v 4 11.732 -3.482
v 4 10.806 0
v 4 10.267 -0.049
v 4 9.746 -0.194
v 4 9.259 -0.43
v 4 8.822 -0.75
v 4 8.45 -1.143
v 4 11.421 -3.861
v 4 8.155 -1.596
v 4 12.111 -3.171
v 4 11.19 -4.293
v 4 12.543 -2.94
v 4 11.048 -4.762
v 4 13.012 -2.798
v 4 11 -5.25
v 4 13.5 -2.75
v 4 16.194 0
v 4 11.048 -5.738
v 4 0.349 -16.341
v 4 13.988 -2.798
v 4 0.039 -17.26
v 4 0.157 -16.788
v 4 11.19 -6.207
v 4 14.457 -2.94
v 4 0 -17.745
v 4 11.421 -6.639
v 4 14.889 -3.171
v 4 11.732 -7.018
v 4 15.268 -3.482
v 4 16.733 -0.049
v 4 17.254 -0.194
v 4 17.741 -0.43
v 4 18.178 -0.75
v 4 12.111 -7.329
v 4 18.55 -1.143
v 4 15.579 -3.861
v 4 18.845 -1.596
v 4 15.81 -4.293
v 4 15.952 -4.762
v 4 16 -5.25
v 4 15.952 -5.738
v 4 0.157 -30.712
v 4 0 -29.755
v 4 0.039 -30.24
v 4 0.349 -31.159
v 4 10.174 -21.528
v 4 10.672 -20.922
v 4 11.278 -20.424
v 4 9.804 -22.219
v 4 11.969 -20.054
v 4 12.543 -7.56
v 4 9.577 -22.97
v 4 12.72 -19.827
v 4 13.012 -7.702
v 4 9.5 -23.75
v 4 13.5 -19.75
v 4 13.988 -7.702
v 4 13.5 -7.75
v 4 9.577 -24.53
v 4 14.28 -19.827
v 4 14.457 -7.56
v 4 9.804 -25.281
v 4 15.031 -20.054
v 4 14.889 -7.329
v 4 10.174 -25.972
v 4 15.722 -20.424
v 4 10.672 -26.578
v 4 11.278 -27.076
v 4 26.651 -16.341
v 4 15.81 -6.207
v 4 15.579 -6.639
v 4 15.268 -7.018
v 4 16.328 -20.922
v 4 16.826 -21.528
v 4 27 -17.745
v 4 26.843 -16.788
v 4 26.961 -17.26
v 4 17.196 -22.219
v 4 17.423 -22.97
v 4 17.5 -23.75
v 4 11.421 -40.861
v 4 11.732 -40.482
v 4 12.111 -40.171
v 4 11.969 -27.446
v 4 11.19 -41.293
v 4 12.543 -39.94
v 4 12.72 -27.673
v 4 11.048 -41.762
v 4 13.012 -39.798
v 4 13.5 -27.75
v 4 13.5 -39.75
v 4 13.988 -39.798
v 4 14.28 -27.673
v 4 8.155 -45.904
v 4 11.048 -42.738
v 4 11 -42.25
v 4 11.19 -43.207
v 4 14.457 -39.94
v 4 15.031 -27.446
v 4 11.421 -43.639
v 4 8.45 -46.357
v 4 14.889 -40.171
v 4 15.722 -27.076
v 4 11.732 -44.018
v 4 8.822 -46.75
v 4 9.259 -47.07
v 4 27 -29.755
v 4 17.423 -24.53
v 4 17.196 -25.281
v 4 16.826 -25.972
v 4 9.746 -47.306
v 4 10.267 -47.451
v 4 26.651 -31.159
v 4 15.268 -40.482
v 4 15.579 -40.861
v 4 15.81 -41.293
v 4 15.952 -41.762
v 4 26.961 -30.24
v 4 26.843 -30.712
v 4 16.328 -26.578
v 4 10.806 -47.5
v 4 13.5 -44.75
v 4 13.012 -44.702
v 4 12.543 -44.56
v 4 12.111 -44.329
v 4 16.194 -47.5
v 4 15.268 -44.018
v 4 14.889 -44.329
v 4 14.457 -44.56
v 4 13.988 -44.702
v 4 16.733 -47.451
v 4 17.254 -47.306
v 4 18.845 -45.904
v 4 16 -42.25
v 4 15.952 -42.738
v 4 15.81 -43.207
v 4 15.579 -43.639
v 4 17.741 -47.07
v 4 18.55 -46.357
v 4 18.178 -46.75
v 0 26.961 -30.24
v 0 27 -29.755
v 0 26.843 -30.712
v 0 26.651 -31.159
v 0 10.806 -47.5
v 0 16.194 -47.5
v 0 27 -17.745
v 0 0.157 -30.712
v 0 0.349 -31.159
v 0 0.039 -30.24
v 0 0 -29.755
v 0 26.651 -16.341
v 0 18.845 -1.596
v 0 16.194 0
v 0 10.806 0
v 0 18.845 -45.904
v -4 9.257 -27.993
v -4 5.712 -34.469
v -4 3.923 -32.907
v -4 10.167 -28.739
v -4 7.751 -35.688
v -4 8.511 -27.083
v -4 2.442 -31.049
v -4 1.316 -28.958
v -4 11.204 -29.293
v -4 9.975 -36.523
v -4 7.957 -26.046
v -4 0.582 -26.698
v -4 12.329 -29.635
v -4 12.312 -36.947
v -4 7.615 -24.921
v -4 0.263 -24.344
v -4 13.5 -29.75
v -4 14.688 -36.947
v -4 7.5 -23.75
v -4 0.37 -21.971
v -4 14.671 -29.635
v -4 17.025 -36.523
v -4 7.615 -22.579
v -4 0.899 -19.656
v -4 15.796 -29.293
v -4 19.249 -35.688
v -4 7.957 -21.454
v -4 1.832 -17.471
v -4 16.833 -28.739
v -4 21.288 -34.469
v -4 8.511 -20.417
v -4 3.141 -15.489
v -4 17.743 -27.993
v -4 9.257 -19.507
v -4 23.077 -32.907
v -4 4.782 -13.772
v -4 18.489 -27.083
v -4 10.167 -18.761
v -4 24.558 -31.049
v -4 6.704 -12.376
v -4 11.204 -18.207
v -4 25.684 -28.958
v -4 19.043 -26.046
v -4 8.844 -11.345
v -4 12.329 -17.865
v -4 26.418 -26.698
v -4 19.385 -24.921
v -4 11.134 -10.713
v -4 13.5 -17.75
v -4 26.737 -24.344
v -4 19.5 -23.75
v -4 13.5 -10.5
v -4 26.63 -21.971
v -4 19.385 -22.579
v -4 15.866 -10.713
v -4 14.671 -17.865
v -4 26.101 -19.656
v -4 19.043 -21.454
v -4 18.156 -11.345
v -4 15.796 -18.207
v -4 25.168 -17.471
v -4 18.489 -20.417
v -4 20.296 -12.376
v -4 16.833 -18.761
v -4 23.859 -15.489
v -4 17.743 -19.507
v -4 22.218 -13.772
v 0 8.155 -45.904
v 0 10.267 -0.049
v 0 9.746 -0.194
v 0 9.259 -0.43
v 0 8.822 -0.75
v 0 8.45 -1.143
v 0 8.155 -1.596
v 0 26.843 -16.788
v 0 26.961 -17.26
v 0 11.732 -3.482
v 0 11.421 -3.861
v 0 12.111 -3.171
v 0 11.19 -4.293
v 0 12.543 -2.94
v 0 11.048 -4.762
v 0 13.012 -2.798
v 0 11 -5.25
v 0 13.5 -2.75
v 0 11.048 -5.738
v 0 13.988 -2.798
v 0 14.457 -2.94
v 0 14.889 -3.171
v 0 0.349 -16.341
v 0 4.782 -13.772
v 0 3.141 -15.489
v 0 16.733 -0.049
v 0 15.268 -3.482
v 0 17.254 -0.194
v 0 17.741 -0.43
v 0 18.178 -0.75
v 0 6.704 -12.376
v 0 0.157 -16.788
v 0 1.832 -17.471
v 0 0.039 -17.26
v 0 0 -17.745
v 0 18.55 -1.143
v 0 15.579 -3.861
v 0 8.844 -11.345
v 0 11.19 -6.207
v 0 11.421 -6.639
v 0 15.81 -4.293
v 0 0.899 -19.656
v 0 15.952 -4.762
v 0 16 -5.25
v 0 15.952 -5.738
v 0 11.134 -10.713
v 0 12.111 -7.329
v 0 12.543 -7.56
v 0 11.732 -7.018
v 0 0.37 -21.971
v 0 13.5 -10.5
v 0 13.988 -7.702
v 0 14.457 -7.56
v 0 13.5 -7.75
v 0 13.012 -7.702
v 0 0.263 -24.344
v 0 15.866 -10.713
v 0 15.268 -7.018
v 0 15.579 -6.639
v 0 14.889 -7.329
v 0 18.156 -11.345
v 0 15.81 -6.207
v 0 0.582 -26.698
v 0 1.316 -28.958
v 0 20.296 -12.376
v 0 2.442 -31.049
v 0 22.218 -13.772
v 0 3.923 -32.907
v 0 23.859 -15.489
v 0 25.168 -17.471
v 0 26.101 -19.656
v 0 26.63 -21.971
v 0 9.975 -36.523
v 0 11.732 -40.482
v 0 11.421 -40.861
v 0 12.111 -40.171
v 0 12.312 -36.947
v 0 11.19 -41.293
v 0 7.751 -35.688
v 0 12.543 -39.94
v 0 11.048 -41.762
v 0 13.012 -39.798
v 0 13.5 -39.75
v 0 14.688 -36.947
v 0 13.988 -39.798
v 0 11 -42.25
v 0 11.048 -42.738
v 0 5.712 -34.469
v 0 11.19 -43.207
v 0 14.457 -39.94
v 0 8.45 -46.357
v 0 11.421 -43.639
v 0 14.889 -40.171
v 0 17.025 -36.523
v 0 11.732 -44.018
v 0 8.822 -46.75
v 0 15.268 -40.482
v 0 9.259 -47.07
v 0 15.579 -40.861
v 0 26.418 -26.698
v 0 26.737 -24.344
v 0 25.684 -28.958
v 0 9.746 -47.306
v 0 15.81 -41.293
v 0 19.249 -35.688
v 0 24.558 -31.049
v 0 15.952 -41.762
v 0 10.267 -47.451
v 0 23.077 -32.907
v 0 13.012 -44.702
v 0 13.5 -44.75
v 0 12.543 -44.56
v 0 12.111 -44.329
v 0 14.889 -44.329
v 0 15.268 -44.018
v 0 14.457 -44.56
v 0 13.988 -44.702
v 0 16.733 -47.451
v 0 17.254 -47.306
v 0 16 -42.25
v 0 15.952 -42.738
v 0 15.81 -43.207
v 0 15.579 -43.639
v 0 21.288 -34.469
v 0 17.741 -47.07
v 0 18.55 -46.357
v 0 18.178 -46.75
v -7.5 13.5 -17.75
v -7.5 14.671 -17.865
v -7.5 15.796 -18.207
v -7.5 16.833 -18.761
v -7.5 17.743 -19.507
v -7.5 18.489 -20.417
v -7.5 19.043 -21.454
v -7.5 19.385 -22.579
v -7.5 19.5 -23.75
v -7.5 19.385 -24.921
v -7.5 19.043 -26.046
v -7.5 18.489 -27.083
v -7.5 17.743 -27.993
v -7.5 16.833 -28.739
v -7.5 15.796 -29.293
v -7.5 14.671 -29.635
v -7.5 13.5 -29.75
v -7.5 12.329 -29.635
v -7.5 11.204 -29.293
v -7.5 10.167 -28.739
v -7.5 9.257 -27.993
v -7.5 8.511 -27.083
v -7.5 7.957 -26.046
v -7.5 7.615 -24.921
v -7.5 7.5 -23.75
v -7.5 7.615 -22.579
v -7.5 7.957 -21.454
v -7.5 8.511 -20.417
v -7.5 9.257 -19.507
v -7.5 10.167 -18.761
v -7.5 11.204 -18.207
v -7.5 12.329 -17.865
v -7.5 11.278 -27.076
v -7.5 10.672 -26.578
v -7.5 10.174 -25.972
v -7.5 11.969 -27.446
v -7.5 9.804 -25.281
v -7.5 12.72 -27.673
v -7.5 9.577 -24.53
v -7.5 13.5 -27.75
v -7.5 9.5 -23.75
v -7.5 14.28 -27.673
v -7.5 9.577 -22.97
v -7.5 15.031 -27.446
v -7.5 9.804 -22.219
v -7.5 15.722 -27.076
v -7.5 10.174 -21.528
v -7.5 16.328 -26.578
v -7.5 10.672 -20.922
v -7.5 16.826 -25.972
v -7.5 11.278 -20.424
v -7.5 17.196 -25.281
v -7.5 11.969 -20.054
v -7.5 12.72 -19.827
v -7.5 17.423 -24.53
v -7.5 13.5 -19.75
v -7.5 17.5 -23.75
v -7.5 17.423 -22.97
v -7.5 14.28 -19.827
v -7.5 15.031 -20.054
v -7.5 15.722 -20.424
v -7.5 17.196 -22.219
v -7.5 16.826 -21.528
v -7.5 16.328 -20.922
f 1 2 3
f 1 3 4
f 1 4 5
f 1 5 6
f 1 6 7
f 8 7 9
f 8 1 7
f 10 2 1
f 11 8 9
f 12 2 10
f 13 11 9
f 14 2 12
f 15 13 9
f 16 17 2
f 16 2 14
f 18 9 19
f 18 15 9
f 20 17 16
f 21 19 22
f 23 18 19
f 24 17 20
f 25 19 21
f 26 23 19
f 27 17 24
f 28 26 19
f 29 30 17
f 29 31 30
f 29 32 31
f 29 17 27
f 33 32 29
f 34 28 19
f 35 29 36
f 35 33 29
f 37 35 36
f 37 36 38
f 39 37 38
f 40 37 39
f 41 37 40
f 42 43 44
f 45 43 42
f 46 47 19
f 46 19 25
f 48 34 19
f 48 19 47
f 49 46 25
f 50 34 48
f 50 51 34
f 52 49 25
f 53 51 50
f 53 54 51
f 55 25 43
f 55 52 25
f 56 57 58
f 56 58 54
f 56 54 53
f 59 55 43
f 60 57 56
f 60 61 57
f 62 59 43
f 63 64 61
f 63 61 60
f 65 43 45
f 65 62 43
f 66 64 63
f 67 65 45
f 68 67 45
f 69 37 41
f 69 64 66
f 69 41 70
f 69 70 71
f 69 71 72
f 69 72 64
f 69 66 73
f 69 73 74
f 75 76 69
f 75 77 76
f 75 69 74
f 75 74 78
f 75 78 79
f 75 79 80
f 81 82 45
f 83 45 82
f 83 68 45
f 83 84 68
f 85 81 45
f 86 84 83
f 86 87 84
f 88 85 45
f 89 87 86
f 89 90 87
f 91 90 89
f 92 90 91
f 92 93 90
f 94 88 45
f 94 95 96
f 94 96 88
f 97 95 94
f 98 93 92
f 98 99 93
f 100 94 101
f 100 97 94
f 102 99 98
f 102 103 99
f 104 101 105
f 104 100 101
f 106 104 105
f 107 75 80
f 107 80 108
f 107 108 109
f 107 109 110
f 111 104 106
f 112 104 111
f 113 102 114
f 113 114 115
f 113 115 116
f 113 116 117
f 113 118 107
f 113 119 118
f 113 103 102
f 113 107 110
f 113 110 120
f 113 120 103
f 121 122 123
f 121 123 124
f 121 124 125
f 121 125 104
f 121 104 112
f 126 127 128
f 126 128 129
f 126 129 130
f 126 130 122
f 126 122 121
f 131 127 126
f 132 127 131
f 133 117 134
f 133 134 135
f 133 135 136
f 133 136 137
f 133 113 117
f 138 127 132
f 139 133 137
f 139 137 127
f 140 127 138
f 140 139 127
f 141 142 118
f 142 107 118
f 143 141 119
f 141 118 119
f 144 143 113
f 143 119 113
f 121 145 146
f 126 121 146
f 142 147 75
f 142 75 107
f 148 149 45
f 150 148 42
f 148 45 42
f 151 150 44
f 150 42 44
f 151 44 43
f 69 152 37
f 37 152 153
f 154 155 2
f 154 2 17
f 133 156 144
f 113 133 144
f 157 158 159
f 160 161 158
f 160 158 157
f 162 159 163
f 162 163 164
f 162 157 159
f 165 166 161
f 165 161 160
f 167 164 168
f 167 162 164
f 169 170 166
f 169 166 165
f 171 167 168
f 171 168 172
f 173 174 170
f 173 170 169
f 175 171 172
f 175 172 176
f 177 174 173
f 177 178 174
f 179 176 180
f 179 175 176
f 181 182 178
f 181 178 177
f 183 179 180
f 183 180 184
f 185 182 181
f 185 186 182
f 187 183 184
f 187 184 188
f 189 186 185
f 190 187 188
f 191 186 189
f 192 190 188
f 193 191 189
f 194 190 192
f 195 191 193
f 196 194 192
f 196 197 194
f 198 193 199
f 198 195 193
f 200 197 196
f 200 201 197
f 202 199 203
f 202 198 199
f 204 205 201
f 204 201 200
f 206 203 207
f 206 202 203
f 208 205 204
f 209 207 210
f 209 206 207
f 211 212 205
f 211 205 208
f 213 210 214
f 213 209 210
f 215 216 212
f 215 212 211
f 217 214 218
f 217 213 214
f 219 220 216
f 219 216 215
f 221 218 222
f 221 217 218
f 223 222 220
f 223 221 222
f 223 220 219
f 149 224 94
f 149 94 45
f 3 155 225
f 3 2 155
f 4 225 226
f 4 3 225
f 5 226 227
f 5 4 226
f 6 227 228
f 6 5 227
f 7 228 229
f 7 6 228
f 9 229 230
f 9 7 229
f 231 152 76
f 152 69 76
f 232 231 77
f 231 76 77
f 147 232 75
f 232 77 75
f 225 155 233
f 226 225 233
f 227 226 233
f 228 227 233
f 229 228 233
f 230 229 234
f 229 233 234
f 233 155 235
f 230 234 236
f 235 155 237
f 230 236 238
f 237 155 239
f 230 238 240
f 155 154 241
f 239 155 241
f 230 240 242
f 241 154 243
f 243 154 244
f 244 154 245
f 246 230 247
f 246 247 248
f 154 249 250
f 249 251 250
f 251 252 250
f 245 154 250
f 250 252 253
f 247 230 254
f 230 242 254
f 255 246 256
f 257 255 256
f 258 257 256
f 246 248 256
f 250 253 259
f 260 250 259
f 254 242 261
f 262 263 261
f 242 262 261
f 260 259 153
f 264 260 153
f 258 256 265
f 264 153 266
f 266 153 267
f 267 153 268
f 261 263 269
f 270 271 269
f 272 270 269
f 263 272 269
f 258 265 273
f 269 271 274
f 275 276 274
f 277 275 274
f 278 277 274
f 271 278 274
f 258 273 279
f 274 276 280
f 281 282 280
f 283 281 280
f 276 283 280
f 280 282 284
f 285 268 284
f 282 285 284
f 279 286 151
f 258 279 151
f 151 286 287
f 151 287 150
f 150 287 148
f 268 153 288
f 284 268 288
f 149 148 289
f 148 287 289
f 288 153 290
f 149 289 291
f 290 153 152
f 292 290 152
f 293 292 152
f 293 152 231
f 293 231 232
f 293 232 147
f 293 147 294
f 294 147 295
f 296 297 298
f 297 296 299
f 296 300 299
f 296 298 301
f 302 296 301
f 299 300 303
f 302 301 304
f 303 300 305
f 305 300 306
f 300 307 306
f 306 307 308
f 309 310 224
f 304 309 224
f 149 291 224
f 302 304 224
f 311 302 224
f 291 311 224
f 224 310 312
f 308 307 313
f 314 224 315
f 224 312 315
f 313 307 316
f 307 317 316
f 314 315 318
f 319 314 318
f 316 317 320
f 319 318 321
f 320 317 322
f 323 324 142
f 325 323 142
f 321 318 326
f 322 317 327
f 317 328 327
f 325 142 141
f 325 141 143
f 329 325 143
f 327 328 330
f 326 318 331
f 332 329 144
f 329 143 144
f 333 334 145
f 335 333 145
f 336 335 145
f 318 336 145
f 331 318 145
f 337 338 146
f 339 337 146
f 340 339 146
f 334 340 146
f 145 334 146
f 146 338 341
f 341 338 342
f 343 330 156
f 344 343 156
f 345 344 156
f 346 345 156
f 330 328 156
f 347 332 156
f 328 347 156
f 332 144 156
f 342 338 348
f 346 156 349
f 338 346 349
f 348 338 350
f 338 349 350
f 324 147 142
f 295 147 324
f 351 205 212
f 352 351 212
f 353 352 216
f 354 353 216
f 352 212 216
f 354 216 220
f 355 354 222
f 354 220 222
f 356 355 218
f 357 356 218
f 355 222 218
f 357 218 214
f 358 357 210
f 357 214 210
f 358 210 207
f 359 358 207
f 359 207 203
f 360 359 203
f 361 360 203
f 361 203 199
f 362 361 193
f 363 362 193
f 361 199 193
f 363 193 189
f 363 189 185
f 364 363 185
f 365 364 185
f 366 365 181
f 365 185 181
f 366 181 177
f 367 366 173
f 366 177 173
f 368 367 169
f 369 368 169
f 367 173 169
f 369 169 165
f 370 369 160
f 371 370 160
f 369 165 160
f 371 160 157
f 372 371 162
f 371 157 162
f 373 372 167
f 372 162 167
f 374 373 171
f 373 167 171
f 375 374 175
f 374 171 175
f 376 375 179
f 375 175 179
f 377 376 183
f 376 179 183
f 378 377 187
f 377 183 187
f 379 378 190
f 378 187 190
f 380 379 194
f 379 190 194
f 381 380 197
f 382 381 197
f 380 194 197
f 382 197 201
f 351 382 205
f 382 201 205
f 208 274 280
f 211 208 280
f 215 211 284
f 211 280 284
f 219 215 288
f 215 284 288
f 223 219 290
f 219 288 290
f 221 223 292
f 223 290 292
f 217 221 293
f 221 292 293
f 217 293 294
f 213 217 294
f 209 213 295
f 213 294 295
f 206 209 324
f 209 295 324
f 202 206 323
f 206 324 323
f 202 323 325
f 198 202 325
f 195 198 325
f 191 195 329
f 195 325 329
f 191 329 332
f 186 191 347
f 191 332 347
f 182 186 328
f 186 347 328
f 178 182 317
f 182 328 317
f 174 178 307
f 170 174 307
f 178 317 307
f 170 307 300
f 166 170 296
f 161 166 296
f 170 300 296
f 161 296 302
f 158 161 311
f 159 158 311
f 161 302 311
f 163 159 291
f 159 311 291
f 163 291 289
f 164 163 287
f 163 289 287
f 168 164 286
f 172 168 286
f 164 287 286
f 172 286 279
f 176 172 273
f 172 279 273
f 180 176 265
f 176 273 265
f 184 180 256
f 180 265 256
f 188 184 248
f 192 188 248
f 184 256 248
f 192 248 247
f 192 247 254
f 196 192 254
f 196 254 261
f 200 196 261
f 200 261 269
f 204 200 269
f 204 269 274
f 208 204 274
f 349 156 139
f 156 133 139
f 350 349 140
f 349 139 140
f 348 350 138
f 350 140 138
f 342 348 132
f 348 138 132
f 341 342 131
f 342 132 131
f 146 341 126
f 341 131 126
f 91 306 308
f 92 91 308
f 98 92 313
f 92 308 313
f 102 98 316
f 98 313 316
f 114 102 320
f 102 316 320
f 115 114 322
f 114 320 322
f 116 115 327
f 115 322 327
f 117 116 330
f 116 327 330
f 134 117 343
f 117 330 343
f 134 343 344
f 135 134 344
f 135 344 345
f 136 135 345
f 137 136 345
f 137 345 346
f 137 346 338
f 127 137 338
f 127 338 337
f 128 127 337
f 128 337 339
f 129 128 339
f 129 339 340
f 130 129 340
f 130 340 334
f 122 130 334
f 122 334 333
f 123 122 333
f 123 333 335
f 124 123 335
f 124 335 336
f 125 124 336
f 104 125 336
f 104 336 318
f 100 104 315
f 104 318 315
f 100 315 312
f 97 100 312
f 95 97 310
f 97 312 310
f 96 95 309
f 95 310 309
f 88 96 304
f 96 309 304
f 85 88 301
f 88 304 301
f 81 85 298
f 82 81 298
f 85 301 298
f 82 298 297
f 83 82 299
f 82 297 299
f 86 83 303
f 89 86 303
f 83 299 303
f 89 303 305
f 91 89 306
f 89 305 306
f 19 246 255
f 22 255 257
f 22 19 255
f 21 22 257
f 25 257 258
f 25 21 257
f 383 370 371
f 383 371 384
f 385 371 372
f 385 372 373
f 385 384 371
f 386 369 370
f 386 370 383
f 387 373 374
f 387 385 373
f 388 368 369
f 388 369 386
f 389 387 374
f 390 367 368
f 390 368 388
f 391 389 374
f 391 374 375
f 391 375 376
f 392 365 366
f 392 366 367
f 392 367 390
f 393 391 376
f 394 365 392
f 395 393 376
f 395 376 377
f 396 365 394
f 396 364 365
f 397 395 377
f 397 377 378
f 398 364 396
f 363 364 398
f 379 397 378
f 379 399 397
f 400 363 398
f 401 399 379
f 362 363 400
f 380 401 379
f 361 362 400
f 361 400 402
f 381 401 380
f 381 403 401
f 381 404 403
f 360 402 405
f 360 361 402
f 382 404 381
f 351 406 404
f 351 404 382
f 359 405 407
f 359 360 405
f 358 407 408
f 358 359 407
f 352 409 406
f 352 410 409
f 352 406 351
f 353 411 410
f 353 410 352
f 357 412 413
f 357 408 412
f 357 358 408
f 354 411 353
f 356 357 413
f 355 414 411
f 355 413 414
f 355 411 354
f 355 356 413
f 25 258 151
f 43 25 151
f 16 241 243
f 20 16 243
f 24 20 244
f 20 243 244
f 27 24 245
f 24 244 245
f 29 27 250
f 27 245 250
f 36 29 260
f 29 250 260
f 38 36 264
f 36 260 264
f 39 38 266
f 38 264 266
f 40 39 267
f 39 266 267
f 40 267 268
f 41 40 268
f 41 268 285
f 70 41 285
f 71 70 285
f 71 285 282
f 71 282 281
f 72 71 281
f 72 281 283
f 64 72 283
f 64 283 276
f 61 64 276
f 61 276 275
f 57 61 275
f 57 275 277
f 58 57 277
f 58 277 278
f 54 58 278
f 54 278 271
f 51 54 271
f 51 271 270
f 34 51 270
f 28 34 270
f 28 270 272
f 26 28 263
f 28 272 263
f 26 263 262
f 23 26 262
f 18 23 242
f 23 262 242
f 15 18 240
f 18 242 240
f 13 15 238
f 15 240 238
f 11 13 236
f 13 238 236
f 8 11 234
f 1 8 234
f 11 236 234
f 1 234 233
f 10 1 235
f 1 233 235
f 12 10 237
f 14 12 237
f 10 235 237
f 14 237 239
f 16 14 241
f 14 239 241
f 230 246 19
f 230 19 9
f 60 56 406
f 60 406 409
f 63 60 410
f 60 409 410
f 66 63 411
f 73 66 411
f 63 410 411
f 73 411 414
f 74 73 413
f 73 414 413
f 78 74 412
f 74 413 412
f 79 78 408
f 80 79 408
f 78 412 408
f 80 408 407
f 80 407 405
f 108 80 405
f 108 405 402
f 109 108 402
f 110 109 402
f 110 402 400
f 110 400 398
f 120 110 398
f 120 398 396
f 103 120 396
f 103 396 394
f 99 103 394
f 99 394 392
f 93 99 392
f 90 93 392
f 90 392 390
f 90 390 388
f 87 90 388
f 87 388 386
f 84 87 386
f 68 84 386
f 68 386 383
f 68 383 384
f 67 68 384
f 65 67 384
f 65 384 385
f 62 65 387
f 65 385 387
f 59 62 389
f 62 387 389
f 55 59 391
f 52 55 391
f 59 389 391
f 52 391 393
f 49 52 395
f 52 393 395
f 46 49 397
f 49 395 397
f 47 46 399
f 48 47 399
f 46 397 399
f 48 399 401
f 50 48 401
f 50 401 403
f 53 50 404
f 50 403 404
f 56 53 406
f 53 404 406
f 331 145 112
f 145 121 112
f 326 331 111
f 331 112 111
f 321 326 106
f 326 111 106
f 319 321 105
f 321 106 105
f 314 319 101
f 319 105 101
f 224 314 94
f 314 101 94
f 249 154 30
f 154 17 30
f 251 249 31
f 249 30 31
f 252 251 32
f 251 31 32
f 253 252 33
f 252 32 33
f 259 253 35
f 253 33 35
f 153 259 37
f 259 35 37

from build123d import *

# Parameters (mm, degrees)
SKETCH_1_W          = 47.5
SKETCH_1_H          = 27
EXTRUDE_1_DEPTH     = 4
SKETCH_5_R          = 13.25
EXTRUDE_2_DEPTH     = 4
SKETCH_6_R          = 6
EXTRUDE_3_DEPTH     = 3.5
SKETCH_7_R          = 4
CUT_EXTRUDE_1_DEPTH = 56.834577101
SKETCH_8_R          = 2.5
CUT_EXTRUDE_2_DEPTH = 56.149796011
CUT_EXTRUDE_3_DEPTH = 56.149796011
FILLET_1_R          = 3


with BuildPart() as part:
    # 草图1 → 凸台-拉伸1 (new body)
    with BuildSketch(Plane(origin=(0, 0, 0), x_dir=(0, 0, -1), z_dir=(1, 0, 0))):
        with Locations((23.75, 13.5)):
            Rectangle(SKETCH_1_W, SKETCH_1_H)
    extrude(amount=EXTRUDE_1_DEPTH)

    # 草图5 → 凸台-拉伸2 (add)
    with BuildSketch(Plane.ZY):
        with Locations((-23.75, 13.5)):
            Circle(SKETCH_5_R)
    extrude(amount=EXTRUDE_2_DEPTH)

    # 草图6 → 凸台-拉伸3 (add)
    with BuildSketch(Plane.ZY.offset(4)):
        with Locations((-23.75, 13.5)):
            Circle(SKETCH_6_R)
    extrude(amount=EXTRUDE_3_DEPTH)

    # 草图7 → 切除-拉伸1 (cut, through all)
    with BuildSketch(Plane.ZY.offset(7.5)):
        with Locations((-23.75, 13.5)):
            Circle(SKETCH_7_R)
    extrude(amount=-CUT_EXTRUDE_1_DEPTH, mode=Mode.SUBTRACT)

    # 草图8 → 切除-拉伸2 (cut, through all)
    with BuildSketch(Plane.ZY):
        with Locations((-42.25, 13.5)):
            Circle(SKETCH_8_R)
        with Locations((-5.25, 13.5)):
            Circle(SKETCH_8_R)
    extrude(amount=-CUT_EXTRUDE_2_DEPTH, mode=Mode.SUBTRACT)

    # 草图9 → 切除-拉伸3 (cut, through all)
    with BuildSketch(Plane.ZY):
        Polygon((-47.5, 9), (-30.5, 0), (-47.5, 0), align=None)
        Polygon((-47.5, 18), (-30.5, 27), (-47.5, 27), align=None)
        Polygon((0, 0), (-17, 0), (0, 9), align=None)
        Polygon((0, 18), (0, 27), (-17, 27), align=None)
    extrude(amount=-CUT_EXTRUDE_3_DEPTH, mode=Mode.SUBTRACT)

    # 圆角1
    fillet_1_edges = [part.edges().sort_by_distance(p)[0] for p in [
        (2, 9, -47.5),
        (2, 0, -30.5),
        (2, 18, -47.5),
        (2, 27, -30.5),
        (2, 9, 0),
        (2, 0, -17),
        (2, 18, 0),
        (2, 27, -17),
    ]]
    fillet(fillet_1_edges, radius=FILLET_1_R)


solid = part.part
